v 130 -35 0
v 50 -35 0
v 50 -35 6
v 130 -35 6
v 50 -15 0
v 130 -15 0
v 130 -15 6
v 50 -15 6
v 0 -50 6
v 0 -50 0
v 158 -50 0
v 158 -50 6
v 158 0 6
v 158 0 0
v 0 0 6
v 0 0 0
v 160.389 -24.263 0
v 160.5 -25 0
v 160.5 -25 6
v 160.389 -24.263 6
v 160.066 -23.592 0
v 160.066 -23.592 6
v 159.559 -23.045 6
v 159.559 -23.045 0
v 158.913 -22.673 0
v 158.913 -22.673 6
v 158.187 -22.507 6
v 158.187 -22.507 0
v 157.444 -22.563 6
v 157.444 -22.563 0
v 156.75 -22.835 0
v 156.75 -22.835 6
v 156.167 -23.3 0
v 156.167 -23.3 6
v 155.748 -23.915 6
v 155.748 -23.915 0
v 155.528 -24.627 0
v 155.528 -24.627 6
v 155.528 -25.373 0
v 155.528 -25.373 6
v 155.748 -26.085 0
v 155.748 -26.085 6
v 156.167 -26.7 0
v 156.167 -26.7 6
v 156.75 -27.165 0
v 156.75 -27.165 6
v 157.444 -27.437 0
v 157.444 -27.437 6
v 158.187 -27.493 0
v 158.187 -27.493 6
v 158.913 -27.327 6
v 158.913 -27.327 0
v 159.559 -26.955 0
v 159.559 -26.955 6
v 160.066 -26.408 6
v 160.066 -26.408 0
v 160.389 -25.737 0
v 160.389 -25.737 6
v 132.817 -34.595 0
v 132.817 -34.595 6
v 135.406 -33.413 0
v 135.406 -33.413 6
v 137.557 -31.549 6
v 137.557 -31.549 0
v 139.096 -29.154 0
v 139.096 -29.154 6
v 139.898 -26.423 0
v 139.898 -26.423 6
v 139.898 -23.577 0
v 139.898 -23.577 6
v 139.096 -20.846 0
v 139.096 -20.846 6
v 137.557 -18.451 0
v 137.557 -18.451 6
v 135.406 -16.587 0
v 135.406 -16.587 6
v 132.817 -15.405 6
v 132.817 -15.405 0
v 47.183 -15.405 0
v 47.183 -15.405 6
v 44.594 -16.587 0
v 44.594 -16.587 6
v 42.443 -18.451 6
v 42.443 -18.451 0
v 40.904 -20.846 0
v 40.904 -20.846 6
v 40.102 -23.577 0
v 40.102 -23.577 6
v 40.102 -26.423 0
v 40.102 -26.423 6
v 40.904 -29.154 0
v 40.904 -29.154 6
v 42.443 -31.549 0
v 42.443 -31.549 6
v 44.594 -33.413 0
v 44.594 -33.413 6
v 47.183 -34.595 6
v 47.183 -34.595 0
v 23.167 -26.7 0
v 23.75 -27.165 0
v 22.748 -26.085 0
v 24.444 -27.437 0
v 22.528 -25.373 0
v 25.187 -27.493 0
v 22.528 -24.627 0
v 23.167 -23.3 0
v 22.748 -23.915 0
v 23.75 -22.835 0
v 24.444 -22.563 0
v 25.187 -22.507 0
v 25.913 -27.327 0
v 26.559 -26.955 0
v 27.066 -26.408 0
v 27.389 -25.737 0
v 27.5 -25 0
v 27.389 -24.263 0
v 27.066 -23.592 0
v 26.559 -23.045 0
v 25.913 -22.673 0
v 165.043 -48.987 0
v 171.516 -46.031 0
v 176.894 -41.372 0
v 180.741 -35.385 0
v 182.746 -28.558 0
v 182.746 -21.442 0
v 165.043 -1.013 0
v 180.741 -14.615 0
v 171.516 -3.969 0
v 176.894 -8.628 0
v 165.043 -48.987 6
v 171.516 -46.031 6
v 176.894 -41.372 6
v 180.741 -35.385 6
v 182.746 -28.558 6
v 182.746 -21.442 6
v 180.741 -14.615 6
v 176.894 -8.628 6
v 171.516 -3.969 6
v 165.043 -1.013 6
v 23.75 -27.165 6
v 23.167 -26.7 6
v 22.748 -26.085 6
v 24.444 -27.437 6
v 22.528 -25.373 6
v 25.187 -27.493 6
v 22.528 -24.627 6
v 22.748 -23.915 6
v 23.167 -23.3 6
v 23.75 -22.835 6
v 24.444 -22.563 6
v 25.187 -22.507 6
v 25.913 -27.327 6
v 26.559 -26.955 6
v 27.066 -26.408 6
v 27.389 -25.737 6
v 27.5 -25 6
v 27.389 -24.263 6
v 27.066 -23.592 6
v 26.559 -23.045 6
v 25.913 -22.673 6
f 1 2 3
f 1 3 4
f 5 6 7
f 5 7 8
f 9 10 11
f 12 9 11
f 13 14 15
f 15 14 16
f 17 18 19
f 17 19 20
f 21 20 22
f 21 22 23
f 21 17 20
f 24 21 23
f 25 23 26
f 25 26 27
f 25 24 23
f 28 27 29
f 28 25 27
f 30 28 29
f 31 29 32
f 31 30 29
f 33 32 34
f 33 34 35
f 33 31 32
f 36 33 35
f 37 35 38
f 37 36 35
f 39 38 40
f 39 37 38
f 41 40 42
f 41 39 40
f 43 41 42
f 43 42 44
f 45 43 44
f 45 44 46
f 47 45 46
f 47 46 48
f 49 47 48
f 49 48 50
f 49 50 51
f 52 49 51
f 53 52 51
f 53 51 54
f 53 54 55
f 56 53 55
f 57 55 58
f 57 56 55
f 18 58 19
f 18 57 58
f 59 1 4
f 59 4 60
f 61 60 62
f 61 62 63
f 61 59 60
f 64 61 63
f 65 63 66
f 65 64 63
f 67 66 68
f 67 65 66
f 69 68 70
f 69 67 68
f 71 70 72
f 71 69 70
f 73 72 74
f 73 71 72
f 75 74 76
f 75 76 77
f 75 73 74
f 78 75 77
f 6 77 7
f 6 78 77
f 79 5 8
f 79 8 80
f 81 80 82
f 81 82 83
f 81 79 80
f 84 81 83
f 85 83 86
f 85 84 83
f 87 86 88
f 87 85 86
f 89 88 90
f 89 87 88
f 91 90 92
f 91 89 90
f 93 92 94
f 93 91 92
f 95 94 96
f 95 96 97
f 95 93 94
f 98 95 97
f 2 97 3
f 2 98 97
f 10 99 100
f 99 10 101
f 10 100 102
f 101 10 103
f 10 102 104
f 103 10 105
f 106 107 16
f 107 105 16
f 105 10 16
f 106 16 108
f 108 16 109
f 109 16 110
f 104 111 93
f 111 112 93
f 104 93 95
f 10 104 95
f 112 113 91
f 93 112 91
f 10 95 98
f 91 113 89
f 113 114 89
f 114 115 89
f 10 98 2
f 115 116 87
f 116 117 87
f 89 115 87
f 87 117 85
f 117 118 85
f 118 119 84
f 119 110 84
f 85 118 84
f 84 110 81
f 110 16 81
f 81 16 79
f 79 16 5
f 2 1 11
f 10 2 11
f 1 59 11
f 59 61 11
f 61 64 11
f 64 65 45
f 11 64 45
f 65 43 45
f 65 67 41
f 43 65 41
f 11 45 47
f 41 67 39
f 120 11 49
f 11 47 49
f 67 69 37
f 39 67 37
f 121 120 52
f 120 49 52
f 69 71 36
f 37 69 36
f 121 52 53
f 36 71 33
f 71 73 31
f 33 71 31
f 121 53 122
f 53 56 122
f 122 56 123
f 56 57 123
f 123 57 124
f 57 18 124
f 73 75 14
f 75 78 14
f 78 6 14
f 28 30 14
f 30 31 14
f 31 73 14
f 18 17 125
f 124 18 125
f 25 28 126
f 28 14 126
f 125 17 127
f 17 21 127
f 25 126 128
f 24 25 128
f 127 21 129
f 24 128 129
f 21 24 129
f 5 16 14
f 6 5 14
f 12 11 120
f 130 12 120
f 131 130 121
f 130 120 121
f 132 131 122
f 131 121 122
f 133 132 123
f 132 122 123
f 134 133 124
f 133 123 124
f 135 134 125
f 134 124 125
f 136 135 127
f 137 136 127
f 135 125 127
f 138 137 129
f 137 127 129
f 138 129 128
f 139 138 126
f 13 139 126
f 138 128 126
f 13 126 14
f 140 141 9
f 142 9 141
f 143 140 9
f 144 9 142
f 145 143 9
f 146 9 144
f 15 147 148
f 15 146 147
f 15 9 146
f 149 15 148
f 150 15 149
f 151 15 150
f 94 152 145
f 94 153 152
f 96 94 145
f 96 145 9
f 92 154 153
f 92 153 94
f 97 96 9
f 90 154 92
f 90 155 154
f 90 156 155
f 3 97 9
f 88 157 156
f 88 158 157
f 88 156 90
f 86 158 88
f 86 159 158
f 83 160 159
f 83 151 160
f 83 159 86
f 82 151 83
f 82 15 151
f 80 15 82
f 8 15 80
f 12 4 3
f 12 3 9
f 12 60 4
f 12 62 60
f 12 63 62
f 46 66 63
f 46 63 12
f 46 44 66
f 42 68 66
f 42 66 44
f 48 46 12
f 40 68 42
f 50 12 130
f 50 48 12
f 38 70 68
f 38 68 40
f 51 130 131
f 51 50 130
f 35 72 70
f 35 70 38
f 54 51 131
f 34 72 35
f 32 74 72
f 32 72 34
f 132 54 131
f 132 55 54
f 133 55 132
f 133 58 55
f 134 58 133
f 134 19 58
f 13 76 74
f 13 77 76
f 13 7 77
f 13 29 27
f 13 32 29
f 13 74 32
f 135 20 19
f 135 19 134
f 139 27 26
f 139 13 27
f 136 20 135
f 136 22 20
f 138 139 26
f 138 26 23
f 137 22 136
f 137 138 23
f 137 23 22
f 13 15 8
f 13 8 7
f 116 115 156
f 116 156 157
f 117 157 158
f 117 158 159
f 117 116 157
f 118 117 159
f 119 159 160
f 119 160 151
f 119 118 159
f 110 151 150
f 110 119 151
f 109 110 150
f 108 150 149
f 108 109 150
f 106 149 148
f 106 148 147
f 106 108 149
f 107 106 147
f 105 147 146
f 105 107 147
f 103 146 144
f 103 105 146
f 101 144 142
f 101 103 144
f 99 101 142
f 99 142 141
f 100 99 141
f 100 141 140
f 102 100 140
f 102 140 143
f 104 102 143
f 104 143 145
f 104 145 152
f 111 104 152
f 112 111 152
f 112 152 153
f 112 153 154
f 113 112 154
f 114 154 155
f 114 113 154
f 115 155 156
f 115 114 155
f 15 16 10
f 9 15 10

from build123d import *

# Parameters (mm, degrees)
SKETCH1_R           = 2.5
BOSS_EXTRUDE1_DEPTH = 6


with BuildPart() as part:
    # Sketch1 → Boss-Extrude1 (new body)
    with BuildSketch(Plane.XY):
        with BuildLine():
            Line((0, -50), (158, -50))
            ThreePointArc((158, -50), (183, -25), (158, 0))
            Line((158, 0), (0, 0))
            Line((0, 0), (0, -50))
        make_face()
        with Locations((25, -25)):
            Circle(SKETCH1_R, mode=Mode.SUBTRACT)
        with Locations((158, -25)):
            Circle(SKETCH1_R, mode=Mode.SUBTRACT)
        with BuildLine():
            Line((50, -35), (130, -35))
            ThreePointArc((130, -35), (140, -25), (130, -15))
            Line((130, -15), (50, -15))
            ThreePointArc((50, -15), (40, -25), (50, -35))
        make_face(mode=Mode.SUBTRACT)
    extrude(amount=BOSS_EXTRUDE1_DEPTH)


solid = part.part
